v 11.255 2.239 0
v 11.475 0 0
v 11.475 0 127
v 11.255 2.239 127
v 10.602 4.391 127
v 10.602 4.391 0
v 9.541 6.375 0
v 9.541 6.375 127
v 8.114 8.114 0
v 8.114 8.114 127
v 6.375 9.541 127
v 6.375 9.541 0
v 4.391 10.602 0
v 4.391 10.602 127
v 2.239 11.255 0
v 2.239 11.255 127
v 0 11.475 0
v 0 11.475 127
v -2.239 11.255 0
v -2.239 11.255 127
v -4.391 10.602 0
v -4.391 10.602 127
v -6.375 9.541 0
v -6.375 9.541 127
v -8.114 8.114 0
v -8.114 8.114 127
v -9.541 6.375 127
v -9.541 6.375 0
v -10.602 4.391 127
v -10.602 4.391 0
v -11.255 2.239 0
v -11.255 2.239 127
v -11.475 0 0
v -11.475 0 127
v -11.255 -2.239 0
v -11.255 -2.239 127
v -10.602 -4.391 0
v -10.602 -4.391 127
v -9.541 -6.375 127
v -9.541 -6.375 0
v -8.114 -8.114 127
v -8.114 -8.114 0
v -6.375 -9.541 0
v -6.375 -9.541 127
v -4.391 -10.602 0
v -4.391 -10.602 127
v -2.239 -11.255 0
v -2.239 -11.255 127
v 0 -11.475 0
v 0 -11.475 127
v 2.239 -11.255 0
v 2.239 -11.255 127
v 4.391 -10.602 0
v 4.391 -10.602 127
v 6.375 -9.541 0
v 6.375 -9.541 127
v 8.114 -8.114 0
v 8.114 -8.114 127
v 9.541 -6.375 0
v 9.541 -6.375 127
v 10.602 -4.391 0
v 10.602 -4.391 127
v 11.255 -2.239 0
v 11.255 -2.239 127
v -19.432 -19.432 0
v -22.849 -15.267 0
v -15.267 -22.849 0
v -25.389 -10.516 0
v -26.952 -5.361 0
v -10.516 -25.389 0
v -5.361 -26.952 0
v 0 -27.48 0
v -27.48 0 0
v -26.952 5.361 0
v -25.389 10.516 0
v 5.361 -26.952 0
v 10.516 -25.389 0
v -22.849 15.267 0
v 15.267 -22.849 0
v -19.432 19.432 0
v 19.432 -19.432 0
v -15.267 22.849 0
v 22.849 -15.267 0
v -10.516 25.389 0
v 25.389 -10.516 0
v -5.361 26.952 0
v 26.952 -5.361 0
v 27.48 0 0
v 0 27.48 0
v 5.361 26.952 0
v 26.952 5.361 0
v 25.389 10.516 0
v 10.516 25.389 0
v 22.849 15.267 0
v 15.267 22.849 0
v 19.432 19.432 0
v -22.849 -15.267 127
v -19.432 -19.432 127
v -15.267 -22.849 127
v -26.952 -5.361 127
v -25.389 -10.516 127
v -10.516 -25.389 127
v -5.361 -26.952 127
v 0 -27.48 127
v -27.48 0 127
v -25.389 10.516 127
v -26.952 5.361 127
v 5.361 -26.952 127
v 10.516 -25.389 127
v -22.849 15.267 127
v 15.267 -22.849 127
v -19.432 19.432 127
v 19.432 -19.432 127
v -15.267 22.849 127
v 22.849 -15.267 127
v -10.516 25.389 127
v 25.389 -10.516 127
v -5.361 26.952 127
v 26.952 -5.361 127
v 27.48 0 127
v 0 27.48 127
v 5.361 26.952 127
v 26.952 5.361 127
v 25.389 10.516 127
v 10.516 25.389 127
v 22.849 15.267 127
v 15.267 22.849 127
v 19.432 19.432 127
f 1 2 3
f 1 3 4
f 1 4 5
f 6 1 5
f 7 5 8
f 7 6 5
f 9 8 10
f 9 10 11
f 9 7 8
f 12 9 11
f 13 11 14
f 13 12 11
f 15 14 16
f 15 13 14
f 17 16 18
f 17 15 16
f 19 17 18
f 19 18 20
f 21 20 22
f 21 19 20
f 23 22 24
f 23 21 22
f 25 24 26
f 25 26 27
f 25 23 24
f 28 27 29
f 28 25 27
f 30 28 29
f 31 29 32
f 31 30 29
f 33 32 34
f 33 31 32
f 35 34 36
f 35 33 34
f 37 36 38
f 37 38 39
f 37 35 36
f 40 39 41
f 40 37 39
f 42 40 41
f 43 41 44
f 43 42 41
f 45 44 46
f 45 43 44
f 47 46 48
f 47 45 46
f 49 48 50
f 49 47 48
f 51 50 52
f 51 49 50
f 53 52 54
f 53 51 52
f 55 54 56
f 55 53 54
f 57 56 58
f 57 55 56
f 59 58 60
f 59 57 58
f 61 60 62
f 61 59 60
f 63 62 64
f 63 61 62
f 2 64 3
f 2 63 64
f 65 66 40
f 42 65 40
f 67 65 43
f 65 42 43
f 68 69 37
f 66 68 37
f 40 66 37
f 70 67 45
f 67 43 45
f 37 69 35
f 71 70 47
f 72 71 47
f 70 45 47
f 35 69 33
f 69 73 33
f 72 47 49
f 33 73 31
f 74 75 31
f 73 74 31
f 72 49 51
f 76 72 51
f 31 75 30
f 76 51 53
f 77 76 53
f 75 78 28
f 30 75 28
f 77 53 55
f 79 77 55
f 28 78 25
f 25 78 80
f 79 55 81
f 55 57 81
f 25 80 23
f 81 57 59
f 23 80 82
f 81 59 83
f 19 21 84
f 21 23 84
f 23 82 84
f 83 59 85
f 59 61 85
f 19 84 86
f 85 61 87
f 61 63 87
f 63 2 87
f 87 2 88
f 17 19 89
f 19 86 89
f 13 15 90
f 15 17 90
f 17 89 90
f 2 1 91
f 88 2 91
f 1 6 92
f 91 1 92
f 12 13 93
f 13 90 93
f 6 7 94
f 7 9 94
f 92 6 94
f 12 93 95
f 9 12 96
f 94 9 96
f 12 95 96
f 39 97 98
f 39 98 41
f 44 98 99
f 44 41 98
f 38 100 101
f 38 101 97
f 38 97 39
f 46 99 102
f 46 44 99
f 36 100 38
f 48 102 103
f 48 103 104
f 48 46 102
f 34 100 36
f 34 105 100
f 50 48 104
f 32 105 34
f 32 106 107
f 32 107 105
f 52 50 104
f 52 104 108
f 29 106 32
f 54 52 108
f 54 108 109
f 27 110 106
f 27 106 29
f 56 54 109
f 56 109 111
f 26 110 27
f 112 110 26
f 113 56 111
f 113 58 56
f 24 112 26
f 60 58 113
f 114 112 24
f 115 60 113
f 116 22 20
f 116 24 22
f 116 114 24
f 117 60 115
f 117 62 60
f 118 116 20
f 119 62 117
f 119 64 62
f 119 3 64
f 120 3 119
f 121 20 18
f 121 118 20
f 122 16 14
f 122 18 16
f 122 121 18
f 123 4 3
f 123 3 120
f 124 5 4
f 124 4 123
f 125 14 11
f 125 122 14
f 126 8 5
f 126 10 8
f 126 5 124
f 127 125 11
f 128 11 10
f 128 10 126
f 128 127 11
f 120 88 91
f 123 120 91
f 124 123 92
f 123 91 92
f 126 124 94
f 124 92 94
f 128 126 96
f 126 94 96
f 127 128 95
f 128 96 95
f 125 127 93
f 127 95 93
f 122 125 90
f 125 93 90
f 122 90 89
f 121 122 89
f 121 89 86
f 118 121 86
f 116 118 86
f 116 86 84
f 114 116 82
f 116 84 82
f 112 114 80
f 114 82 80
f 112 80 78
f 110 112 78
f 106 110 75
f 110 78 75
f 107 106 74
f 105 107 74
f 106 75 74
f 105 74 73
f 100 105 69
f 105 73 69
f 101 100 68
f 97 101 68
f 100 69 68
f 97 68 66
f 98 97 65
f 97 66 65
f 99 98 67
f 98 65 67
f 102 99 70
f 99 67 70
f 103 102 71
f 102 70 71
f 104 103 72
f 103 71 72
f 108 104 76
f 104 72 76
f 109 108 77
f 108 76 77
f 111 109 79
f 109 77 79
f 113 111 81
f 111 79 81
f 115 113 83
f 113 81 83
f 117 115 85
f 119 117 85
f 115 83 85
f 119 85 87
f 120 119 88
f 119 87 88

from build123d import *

# Parameters (mm, degrees)
F0_R     = 27.480462
F0_R_2   = 11.475205
F1_DEPTH = 127
F2_R     = 26.7589
F3_DEPTH = 38.1


with BuildPart() as f1:
    # F0 (on Top) → F1 (new body)
    with BuildSketch(Plane.XY):
        Circle(F0_R)
        Circle(F0_R_2, mode=Mode.SUBTRACT)
    extrude(amount=F1_DEPTH)


with BuildPart() as f3:
    # F2 (on Front) → F3 (new body, symmetric)
    with BuildSketch(Plane.XZ):
        with Locations((-124.147885, 27.501423)):
            Circle(F2_R)
    extrude(amount=F3_DEPTH, both=True)


solid = f1.part
